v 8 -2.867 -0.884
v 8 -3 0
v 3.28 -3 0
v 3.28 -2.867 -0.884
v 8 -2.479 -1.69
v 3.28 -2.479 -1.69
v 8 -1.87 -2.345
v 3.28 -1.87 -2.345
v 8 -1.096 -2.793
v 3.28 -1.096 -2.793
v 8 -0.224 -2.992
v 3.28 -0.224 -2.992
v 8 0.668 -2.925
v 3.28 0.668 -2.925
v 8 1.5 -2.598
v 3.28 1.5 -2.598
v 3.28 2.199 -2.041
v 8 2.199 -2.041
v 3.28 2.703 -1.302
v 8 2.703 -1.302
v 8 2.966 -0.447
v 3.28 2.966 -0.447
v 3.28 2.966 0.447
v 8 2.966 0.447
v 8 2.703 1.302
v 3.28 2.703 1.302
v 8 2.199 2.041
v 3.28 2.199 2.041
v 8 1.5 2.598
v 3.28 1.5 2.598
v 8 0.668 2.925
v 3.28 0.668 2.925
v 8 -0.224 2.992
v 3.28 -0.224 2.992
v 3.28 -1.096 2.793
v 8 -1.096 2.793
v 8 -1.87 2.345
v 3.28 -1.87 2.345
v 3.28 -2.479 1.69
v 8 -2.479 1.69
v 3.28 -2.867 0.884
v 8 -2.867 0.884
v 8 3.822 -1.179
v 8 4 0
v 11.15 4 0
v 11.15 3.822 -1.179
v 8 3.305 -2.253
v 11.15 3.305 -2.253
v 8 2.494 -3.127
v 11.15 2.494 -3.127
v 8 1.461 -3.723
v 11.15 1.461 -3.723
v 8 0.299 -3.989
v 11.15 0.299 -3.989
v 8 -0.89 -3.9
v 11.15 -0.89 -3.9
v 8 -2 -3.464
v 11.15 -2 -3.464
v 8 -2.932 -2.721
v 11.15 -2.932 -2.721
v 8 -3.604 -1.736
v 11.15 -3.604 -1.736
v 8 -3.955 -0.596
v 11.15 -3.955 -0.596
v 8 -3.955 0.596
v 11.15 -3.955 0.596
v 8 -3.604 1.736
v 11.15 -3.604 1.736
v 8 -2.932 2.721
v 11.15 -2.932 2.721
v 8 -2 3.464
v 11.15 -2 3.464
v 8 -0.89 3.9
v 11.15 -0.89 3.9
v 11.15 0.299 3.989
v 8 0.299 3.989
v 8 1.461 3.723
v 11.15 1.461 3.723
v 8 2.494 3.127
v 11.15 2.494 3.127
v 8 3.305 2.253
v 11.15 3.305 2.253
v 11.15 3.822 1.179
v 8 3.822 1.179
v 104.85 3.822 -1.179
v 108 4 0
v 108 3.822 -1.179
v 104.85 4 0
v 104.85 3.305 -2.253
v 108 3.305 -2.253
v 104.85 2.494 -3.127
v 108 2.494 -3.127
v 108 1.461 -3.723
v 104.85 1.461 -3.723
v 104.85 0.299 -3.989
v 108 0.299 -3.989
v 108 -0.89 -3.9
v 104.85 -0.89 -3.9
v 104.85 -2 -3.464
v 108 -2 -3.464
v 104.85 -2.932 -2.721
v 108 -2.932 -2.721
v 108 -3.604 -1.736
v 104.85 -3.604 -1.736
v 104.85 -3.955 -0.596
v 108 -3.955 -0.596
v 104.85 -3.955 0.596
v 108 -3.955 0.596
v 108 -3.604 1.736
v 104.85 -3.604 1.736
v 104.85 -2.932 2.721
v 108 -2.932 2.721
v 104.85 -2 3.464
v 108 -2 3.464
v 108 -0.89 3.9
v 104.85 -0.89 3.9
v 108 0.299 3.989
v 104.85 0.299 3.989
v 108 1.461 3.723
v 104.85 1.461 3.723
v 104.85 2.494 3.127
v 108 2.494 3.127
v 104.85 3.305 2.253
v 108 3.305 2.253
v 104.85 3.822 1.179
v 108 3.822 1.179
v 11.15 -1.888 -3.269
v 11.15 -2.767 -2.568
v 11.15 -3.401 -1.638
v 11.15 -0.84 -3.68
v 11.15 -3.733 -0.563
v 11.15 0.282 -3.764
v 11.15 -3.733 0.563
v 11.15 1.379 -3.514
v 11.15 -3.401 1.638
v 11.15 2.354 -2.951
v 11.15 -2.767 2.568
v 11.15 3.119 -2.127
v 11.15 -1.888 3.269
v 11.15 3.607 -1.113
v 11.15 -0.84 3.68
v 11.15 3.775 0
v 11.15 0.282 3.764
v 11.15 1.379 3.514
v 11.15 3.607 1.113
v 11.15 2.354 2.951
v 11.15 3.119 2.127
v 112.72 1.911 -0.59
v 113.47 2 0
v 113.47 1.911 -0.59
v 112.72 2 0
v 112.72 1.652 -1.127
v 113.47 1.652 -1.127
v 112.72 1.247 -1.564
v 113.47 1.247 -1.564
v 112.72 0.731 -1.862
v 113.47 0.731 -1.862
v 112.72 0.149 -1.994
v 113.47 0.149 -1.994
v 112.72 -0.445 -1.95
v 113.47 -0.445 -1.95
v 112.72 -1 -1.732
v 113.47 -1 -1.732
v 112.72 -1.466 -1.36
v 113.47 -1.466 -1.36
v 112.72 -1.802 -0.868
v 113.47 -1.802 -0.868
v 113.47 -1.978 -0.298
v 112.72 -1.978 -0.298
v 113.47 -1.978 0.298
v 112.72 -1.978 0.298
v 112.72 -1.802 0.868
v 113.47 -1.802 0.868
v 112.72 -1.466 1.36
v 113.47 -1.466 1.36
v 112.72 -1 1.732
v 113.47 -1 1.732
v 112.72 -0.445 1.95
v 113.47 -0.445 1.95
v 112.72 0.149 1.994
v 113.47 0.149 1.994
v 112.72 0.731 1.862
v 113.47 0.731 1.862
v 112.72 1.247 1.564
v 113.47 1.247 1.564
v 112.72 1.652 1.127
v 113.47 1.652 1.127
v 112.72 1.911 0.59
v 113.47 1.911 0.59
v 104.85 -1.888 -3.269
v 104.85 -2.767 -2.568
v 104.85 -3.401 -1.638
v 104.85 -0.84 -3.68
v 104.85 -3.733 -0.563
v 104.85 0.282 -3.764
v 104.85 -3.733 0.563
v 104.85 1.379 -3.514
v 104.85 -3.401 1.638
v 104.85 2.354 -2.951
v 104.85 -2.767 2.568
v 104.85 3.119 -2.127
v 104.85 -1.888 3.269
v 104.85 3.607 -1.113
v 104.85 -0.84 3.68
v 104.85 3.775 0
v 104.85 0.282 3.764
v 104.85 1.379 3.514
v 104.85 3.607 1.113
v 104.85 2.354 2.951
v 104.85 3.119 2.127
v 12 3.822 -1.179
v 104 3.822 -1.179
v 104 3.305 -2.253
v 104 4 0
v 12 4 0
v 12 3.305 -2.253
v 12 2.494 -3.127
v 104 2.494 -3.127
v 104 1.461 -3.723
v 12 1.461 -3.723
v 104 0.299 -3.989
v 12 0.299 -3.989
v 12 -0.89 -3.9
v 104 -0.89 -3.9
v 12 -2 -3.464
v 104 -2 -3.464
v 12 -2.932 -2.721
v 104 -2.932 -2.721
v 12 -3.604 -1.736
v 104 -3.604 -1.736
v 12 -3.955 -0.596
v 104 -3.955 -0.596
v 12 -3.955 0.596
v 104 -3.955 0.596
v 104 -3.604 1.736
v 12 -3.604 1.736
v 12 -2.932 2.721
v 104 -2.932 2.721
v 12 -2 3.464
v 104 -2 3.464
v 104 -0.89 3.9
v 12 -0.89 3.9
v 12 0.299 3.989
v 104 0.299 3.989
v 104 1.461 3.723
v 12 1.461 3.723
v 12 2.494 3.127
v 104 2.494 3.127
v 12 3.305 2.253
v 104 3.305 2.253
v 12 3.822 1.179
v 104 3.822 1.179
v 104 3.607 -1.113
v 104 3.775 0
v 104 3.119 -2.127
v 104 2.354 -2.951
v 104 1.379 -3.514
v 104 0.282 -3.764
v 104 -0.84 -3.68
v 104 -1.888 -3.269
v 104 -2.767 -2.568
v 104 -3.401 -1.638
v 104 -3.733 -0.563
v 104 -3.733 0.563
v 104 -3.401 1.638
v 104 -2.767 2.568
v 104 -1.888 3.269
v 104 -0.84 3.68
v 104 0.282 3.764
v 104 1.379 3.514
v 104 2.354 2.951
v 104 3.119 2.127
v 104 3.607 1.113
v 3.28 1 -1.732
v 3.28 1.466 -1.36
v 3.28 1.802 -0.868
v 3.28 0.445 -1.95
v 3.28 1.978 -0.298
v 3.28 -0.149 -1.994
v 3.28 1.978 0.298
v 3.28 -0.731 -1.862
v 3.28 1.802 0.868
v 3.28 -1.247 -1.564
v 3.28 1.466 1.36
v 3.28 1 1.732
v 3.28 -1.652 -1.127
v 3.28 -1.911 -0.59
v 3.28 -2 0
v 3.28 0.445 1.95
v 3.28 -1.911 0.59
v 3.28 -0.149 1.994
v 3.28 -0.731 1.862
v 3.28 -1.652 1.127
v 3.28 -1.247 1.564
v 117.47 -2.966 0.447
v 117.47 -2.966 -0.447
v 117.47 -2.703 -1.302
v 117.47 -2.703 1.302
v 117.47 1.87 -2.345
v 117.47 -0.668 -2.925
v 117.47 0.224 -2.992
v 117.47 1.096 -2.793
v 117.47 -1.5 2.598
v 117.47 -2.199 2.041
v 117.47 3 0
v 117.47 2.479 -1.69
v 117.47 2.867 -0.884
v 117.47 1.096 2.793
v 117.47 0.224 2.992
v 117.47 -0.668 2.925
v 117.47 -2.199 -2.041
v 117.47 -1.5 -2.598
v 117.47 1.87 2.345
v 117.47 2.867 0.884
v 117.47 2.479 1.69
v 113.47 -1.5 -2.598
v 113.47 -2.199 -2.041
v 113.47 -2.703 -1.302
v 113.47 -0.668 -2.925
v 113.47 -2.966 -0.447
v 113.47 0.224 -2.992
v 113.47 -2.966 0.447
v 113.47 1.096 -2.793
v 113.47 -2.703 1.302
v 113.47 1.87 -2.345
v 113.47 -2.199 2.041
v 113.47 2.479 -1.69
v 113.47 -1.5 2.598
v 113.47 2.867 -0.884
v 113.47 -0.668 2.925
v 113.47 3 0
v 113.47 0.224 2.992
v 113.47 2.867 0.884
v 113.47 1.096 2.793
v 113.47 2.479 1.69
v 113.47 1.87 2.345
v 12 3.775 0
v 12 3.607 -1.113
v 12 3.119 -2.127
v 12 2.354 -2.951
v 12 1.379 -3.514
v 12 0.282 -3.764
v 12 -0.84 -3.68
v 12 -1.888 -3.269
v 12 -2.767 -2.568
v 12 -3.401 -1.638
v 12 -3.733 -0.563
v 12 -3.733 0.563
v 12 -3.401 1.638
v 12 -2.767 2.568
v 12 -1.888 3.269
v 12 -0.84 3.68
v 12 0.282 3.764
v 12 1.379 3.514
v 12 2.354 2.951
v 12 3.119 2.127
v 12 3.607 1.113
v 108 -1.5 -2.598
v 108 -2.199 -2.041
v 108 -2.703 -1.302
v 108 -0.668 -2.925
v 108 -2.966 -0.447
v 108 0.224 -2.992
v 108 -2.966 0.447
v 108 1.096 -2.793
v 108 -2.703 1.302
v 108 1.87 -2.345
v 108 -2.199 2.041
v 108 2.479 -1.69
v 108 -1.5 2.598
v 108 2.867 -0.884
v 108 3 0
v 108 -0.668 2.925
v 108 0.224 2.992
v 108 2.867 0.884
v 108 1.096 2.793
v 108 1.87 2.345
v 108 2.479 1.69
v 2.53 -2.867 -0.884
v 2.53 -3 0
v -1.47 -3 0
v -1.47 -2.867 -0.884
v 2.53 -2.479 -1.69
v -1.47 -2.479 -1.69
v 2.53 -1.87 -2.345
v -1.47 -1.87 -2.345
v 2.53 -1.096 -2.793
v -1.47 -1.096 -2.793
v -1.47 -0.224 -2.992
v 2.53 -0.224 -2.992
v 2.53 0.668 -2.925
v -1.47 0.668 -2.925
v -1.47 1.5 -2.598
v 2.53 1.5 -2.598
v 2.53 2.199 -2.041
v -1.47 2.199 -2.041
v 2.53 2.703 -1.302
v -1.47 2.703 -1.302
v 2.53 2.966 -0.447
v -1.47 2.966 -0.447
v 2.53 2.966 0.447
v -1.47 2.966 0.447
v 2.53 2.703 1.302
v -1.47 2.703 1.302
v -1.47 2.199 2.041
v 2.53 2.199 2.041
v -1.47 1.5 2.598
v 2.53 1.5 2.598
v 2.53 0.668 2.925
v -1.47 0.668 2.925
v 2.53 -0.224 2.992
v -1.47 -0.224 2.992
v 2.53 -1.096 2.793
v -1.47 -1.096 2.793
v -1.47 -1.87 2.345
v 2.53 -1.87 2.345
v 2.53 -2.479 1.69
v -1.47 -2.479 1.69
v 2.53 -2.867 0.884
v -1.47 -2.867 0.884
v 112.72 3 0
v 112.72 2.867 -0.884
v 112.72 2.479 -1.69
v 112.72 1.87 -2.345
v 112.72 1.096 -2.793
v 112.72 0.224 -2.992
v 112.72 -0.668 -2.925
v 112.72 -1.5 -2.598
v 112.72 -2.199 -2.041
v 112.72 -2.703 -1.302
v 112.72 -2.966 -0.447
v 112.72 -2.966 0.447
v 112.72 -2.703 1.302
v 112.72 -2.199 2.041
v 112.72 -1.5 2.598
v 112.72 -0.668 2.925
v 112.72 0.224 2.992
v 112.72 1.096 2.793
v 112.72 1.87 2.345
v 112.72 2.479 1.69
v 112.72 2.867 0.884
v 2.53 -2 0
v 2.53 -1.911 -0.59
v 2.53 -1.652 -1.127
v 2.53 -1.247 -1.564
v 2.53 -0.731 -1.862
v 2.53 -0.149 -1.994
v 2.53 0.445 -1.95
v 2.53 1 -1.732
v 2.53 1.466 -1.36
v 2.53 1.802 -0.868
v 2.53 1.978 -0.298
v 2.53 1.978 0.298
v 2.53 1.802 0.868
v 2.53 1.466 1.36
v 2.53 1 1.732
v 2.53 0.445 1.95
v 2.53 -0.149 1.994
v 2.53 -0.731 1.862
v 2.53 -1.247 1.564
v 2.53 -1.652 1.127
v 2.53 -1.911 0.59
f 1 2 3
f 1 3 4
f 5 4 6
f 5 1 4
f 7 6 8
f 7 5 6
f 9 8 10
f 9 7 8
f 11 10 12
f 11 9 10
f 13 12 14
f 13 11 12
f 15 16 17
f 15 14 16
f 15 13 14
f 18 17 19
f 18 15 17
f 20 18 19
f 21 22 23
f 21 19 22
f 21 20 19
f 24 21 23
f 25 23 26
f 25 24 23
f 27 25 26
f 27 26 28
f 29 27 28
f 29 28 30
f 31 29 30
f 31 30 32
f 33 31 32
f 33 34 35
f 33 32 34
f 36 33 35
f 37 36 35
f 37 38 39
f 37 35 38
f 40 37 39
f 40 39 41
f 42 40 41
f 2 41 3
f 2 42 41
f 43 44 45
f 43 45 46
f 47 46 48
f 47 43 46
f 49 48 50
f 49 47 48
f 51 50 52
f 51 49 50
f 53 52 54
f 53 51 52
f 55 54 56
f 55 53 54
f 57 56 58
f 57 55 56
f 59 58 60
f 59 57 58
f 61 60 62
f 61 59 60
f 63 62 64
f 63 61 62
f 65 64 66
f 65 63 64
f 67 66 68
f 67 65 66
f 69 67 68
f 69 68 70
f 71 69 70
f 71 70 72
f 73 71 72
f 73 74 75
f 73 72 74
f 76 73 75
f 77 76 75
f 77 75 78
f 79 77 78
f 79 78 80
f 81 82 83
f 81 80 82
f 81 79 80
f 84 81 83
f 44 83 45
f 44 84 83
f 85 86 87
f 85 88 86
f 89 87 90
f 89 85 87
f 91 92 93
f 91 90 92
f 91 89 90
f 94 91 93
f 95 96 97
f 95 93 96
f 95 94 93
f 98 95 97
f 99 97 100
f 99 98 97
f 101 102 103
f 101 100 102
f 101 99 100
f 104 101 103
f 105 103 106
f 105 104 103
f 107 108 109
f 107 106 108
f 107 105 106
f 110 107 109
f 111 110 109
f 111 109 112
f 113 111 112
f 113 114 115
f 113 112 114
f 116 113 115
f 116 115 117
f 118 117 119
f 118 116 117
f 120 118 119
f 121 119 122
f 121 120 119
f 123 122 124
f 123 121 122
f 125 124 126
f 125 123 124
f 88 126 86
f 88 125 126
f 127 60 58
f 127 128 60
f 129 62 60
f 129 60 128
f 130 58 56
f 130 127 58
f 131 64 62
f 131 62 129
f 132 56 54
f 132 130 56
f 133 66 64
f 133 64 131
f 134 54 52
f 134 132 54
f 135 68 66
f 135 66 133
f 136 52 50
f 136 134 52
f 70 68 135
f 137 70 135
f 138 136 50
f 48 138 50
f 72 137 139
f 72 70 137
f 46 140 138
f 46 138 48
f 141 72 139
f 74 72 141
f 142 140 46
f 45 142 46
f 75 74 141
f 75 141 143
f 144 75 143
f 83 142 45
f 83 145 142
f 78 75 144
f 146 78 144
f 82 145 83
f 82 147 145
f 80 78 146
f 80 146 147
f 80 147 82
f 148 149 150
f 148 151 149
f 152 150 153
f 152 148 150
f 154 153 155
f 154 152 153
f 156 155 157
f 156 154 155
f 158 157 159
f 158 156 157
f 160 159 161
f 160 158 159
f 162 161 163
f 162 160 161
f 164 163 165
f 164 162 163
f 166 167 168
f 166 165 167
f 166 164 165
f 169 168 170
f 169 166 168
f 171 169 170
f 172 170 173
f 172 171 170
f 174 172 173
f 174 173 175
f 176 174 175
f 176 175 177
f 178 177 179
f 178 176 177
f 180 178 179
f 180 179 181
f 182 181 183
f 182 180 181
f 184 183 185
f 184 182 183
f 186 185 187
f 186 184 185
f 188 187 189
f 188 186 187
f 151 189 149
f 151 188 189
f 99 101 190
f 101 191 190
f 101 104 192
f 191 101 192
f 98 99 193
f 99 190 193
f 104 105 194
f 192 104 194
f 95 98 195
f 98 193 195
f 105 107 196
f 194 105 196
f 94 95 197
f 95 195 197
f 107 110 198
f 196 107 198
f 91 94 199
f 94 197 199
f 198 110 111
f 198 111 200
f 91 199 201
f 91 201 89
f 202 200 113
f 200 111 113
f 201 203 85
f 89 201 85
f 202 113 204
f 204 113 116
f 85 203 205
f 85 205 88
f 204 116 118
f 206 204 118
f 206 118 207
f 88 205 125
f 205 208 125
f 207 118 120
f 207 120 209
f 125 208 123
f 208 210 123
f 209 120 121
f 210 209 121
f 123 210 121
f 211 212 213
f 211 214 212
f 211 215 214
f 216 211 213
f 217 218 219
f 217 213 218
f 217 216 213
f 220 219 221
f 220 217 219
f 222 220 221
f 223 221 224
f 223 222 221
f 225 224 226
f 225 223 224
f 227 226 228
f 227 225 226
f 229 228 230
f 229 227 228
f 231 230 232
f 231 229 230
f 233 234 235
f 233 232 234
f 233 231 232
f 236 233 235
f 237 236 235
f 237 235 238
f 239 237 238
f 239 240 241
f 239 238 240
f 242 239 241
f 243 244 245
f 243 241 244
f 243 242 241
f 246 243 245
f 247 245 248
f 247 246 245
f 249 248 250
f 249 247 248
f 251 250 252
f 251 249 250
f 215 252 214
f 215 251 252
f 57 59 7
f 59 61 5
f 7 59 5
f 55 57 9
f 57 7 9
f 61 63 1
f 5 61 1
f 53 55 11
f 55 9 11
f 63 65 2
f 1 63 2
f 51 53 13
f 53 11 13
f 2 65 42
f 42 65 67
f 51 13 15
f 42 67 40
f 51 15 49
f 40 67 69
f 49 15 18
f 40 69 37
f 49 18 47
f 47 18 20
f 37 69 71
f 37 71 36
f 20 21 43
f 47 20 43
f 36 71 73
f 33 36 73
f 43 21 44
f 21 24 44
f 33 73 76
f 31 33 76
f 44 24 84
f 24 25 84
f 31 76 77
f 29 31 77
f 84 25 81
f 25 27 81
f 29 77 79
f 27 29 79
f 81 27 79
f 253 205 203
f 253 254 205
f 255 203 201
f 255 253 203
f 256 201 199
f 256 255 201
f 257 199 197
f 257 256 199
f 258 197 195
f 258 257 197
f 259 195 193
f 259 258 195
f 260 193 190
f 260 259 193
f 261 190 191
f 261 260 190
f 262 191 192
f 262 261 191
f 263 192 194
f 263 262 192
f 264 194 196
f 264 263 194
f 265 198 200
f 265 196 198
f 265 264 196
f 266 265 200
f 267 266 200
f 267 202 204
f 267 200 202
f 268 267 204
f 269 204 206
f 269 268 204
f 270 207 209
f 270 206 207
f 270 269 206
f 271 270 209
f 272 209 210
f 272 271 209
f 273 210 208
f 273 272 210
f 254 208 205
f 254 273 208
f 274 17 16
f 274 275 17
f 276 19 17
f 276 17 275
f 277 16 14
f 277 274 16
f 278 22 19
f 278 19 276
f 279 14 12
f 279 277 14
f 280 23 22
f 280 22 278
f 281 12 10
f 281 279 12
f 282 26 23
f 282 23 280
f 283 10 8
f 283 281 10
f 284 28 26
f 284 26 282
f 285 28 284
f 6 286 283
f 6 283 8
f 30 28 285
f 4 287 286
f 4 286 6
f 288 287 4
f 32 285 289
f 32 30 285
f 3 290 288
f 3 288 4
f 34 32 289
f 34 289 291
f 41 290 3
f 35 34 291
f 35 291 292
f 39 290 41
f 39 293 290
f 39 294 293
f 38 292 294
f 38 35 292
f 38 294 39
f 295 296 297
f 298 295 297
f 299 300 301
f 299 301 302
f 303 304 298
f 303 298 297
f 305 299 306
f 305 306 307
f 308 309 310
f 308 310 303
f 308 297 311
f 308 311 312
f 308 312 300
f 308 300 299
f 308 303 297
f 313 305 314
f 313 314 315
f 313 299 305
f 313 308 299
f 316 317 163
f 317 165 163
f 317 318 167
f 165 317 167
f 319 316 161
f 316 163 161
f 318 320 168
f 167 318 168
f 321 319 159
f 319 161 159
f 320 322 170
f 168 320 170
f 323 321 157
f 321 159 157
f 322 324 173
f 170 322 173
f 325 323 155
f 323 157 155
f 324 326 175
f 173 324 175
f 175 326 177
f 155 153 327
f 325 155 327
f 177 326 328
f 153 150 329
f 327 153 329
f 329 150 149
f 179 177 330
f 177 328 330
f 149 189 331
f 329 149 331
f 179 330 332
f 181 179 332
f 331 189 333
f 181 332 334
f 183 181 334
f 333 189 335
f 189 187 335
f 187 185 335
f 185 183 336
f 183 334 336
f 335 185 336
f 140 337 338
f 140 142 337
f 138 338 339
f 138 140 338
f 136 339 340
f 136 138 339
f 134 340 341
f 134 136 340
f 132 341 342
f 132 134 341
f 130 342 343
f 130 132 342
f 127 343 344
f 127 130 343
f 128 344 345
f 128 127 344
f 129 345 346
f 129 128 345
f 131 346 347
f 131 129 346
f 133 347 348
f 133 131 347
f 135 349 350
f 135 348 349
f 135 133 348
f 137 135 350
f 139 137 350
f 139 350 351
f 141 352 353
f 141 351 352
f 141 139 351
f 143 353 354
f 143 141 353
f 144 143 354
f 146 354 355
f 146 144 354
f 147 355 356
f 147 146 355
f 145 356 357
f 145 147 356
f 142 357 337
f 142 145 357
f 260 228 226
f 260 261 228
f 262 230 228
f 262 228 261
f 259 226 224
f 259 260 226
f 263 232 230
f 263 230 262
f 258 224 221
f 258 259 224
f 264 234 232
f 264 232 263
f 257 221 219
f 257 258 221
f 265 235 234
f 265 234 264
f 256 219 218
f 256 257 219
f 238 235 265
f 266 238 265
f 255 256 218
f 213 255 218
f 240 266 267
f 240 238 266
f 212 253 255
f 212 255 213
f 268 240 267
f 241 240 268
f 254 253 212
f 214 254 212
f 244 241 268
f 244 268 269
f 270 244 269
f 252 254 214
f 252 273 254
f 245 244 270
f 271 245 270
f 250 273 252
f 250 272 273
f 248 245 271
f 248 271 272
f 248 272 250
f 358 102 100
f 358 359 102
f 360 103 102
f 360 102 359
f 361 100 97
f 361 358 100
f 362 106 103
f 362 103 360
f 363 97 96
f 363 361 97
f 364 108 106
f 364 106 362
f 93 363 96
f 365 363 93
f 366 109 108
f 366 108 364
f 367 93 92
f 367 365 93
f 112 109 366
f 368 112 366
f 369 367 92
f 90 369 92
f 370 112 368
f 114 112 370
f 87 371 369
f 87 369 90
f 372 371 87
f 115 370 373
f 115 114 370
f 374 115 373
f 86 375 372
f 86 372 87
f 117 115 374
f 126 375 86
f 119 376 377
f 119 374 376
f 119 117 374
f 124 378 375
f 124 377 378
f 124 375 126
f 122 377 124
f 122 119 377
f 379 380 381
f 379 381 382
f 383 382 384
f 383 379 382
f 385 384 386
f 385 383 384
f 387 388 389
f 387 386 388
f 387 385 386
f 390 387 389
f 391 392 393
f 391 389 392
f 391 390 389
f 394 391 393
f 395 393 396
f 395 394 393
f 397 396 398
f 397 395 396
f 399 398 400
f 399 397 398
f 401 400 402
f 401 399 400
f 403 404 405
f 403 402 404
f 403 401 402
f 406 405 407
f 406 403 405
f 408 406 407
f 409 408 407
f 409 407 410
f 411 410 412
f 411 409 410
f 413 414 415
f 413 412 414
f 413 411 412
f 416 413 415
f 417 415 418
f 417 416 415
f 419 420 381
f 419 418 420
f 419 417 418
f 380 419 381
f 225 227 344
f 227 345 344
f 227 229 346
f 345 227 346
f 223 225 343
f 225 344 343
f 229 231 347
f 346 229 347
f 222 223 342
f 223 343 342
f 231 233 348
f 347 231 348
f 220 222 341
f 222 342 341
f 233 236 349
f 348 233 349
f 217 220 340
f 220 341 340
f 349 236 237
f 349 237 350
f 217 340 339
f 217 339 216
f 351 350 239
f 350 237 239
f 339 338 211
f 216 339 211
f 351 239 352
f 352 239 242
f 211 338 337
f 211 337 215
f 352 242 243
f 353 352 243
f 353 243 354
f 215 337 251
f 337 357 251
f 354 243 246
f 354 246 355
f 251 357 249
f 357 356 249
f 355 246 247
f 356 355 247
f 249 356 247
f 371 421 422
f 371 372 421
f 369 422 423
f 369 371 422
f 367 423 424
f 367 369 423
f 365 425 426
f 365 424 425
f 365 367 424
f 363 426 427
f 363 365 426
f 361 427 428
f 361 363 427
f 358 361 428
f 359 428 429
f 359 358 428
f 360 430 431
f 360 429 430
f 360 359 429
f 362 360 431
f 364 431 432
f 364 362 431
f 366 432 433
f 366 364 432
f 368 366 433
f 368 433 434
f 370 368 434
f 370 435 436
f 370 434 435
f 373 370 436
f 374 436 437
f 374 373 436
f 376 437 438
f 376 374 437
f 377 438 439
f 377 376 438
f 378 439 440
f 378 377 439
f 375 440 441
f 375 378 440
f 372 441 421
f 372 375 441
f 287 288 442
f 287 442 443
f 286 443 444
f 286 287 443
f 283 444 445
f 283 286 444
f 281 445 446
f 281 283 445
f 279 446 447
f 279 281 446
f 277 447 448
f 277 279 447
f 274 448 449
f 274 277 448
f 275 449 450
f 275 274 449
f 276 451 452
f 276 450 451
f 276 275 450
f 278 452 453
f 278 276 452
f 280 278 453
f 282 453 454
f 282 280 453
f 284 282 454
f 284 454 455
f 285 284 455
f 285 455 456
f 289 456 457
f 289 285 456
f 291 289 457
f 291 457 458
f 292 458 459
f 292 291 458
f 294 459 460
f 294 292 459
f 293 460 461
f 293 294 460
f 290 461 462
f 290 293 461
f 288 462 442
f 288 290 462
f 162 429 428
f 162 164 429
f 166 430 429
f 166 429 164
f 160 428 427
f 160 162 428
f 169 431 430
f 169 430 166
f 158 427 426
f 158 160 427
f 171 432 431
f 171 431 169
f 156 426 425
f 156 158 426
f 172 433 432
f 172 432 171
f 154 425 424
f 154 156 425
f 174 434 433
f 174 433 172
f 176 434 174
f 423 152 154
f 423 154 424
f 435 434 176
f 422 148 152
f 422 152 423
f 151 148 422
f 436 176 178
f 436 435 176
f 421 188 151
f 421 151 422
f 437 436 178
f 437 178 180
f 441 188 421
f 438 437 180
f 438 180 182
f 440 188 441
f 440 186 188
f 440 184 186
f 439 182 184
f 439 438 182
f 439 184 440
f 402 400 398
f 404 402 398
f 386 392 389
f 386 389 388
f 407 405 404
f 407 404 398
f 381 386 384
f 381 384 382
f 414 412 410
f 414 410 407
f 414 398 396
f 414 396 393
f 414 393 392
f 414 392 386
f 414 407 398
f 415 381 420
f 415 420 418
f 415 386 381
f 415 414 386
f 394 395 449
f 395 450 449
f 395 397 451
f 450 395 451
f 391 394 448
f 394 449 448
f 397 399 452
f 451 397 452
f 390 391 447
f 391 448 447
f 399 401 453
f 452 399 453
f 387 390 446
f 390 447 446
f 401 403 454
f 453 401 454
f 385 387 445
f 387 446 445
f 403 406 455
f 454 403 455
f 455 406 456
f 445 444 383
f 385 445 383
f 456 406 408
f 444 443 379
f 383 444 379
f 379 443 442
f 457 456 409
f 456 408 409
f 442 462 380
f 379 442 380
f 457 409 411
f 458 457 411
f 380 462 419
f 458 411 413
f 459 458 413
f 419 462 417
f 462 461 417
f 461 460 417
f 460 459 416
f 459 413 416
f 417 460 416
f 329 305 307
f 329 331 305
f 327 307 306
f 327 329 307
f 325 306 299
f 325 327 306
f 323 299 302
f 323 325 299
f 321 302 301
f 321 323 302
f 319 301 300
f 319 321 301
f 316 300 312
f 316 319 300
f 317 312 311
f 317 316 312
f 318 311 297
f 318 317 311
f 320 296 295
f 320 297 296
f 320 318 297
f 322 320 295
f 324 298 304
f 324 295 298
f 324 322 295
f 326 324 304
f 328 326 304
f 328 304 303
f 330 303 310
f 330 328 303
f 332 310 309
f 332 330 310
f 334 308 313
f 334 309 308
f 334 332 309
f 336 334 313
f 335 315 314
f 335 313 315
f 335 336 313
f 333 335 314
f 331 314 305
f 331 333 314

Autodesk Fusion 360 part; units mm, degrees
sketch "Sketch1" plane through (0, 0, 0) normal (1, 0, 0) x (0, 1, 0)
  circle A0 centre (0, 0) radius 3
  dimension "d1" = 6
extrude "Extrude1" add sketch "Sketch1" along normal blind 8
sketch "Sketch2" plane through (8, 0, 0) normal (1, 0, 0) x (0, 1, 0)
  circle A0 centre (0, 0) radius 3
  circle A1 centre (0, 0) radius 4
  dimension "d4" = 8
extrude "Extrude2" add sketch "Sketch2" along normal blind 3.15 contours A0 | A1
sketch "Sketch3" plane through (11.15, 0, 0) normal (1, 0, 0) x (0, 1, 0)
  circle A0 centre (0, 0) radius 4
  circle A1 centre (0, 0) radius 3.775
  dimension "d7" = 7.55
extrude "Extrude3" add sketch "Sketch3" along normal blind 0.85 contours A1
sketch "Sketch4" plane through (12, 0, 0) normal (1, 0, 0) x (0, 1, 0)
  circle A0 centre (0, 0) radius 3.775
  circle A1 centre (0, 0) radius 4
  dimension "d10" = 8
extrude "Extrude4" add sketch "Sketch4" along normal blind 92 contours A0 | A1
sketch "Sketch5" plane through (104, 0, 0) normal (1, 0, 0) x (0, 1, 0)
  circle A0 centre (0, 0) radius 4
  circle A1 centre (0, 0) radius 3.775
  dimension "d13" = 7.55
extrude "Extrude5" add sketch "Sketch5" along normal blind 0.85 contours A1
sketch "Sketch6" plane through (104.85, 0, 0) normal (1, 0, 0) x (0, 1, 0)
  circle A0 centre (0, 0) radius 3.775
  circle A1 centre (0, 0) radius 4
  dimension "d16" = 8
extrude "Extrude6" add sketch "Sketch6" along normal blind 3.15 contours A0 | A1
extrude "Extrude8" cut 1 faces at (0, -1.1591, 0.5829) along direction (1, 0, 0) blind 8
sketch "Sketch8" plane through (8, 0, 0) normal (-1, 0, 0) x (0, -1, 0)
  circle A0 centre (0, 0) radius 4
  circle A1 centre (0, 0) radius 3
  dimension "d24" = 6
extrude "Extrude9" add sketch "Sketch8" along normal blind 4.72 contours A1
sketch "Sketch9" plane through (3.28, 0, 0) normal (-1, 0, 0) x (0, -1, 0)
  circle A0 centre (0, 0) radius 3
  circle A1 centre (0, 0) radius 2
  dimension "d27" = 4
extrude "Extrude10" add sketch "Sketch9" along normal blind 0.75 contours A1
sketch "Sketch10" plane through (2.53, 0, 0) normal (-1, 0, 0) x (0, -1, 0)
  circle A0 centre (0, 0) radius 2
  circle A1 centre (0, 0) radius 3
  dimension "d30" = 6
extrude "Extrude11" add sketch "Sketch10" along normal blind 4 contours A0 | A1
sketch "Sketch11" plane through (108, 0, 0) normal (1, 0, 0) x (0, 1, 0)
  circle A0 centre (0, 0) radius 4
  circle A1 centre (0, 0) radius 3
  dimension "d33" = 6
extrude "Extrude12" add sketch "Sketch11" along normal blind 4.72 contours A1
sketch "Sketch12" plane through (112.72, 0, 0) normal (1, 0, 0) x (0, 1, 0)
  circle A0 centre (0, 0) radius 3
  circle A1 centre (0, 0) radius 2
  dimension "d36" = 4
extrude "Extrude13" add sketch "Sketch12" along normal blind 0.75 contours A1
sketch "Sketch13" plane through (113.47, 0, 0) normal (1, 0, 0) x (0, 1, 0)
  circle A0 centre (0, 0) radius 2
  circle A1 centre (0, 0) radius 3
  dimension "d39" = 6
extrude "Extrude14" add sketch "Sketch13" along normal blind 4 contours A0 | A1
equation "d17 = 100 mm - 96.85 mm"
